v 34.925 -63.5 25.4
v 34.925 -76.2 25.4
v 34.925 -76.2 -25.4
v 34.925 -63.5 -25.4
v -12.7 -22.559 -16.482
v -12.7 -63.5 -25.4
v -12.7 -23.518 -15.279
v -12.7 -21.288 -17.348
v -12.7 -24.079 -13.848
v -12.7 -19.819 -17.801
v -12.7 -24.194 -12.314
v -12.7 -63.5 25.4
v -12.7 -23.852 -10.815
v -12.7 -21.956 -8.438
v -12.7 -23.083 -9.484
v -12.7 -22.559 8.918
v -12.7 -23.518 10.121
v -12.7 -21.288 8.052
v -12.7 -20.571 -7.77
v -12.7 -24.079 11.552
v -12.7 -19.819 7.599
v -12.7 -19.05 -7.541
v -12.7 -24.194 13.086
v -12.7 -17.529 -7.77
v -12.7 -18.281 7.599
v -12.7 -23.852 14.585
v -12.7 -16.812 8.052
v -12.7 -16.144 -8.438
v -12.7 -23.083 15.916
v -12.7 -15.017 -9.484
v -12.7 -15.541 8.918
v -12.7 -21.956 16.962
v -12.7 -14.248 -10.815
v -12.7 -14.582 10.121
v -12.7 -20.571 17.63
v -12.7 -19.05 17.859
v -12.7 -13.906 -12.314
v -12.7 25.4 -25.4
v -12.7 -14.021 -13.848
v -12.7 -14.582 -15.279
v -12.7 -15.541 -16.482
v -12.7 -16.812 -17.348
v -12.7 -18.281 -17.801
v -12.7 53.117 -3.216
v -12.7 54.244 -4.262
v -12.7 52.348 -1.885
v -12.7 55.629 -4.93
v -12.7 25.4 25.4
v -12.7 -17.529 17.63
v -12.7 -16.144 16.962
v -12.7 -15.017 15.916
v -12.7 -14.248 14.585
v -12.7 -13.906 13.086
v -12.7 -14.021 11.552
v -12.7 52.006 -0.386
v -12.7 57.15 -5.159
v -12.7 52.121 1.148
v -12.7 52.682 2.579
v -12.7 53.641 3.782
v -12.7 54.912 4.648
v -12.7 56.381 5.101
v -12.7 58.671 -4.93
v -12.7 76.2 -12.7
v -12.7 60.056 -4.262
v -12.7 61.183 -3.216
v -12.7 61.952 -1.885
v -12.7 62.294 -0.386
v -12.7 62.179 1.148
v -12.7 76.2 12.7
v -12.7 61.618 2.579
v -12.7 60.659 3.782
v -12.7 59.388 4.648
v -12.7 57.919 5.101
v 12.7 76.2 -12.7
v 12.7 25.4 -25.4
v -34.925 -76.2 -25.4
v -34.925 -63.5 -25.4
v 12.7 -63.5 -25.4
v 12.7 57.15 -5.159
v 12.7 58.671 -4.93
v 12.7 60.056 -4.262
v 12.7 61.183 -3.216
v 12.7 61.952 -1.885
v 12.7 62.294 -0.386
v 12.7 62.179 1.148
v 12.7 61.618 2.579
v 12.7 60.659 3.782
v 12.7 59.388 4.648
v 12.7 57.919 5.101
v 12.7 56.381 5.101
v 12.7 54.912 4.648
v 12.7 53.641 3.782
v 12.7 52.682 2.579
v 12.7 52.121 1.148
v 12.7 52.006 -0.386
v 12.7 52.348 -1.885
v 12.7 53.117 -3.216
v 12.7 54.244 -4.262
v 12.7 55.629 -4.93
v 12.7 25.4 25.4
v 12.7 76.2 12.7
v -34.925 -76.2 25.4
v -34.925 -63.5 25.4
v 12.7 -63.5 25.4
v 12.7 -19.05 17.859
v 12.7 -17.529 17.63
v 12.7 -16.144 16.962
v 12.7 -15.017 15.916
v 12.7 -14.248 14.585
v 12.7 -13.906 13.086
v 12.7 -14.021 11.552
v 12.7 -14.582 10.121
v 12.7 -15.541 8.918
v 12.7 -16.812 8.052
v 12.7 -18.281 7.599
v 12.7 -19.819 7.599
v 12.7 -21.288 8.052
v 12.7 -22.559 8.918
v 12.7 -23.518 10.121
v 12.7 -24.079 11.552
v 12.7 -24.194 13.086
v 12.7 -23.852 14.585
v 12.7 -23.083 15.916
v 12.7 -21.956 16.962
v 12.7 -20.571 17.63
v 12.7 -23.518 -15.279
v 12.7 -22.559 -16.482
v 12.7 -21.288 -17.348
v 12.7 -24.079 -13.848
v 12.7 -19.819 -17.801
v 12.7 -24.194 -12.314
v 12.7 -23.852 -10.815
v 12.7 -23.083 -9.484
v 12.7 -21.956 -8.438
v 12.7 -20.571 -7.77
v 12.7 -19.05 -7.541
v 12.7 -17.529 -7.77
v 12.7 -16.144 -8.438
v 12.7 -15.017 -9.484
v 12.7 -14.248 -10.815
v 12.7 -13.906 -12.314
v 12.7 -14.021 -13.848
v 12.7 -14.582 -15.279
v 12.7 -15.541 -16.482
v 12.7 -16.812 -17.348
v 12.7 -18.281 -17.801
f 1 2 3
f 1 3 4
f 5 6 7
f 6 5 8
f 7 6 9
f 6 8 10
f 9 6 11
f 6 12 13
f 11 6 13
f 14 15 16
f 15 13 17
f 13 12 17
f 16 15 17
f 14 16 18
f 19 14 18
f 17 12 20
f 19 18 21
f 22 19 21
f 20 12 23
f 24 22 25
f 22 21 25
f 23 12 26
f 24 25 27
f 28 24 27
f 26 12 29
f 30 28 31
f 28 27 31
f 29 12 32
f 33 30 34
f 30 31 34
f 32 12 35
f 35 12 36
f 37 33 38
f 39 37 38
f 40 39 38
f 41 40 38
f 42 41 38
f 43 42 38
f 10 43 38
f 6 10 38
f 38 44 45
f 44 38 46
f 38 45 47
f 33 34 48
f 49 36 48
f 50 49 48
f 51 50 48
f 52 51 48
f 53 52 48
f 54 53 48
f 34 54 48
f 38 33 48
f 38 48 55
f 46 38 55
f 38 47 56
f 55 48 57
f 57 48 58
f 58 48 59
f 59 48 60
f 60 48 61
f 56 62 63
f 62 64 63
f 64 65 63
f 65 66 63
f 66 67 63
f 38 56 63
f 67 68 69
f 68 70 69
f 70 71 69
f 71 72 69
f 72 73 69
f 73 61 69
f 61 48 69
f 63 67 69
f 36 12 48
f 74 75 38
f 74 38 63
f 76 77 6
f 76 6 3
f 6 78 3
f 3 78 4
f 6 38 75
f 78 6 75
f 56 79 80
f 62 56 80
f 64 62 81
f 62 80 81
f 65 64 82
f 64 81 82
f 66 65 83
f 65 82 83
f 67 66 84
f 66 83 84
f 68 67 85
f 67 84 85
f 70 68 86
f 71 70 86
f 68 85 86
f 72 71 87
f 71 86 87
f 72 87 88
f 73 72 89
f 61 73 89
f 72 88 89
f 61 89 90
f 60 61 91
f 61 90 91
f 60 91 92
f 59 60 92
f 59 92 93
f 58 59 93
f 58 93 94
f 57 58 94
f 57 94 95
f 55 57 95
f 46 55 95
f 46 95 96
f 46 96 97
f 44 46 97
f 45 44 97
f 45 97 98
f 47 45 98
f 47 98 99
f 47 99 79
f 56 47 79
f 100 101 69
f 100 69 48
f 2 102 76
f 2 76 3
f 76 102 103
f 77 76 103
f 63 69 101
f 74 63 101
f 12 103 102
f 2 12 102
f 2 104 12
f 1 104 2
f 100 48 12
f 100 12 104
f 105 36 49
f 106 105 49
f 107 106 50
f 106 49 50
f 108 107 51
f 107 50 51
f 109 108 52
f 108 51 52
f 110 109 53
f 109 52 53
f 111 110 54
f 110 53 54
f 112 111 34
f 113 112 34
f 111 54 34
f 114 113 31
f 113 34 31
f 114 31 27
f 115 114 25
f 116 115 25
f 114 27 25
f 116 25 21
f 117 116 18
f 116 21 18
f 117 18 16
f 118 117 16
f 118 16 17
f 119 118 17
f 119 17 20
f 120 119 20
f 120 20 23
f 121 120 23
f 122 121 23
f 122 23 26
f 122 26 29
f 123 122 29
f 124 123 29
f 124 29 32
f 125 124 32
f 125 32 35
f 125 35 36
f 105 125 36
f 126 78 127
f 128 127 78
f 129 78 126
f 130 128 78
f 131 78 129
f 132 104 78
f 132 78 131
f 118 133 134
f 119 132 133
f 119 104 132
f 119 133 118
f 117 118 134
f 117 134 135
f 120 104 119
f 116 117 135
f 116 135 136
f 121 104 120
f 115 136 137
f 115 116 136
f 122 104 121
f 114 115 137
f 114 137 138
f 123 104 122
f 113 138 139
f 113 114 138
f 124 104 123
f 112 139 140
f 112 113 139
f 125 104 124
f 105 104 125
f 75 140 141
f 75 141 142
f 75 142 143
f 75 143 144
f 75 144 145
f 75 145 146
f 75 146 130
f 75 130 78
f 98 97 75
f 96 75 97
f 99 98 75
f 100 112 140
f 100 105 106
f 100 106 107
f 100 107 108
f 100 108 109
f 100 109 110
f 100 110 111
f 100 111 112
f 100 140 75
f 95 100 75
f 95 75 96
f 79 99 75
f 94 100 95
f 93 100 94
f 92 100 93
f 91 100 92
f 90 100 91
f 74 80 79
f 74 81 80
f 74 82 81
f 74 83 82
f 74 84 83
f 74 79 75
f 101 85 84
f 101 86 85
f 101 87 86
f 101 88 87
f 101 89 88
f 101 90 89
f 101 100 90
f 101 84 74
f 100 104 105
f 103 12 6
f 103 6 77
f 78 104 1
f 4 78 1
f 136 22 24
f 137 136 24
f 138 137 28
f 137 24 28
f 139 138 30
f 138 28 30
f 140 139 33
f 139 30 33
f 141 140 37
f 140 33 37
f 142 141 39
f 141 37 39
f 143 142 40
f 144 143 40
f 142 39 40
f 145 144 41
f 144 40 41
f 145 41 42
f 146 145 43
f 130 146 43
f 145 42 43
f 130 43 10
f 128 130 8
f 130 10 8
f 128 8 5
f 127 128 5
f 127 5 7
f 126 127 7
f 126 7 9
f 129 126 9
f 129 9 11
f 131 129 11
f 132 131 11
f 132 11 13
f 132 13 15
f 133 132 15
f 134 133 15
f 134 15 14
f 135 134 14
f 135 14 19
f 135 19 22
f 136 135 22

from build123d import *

# Parameters (mm, degrees)
SKETCH27_W                 = 69.85
SKETCH27_H                 = 152.4
BOSS_EXTRUDE4_DEPTH        = 25.4
SKETCH28_W                 = 22.225
SKETCH28_H                 = 139.7
CUT_EXTRUDE5_DEPTH         = 26.4
SKETCH30_OUTSIDE_W         = 87.834
SKETCH30_OUTSIDE_H         = 189.434
CUT_EXTRUDE6_DEPTH         = 35.925
CUT_EXTRUDE6_DEPTH_BACK    = 35.925
F_3_8_CLEARANCE_HOLE4_D    = 10.31748
AUXILIARY_MOUNTING_HOLES_D = 10.31748


with BuildPart() as part:
    # Sketch27 → Boss-Extrude4 (new body, symmetric)
    with BuildSketch(Plane.XY):
        Rectangle(SKETCH27_W, SKETCH27_H)
    extrude(amount=BOSS_EXTRUDE4_DEPTH, both=True)

    # Sketch28 → Cut-Extrude5 (cut, symmetric)
    with BuildSketch(Plane.XY):
        with Locations((23.8125, 6.35)):
            Rectangle(SKETCH28_W, SKETCH28_H)
    cut_extrude5 = extrude(amount=CUT_EXTRUDE5_DEPTH, both=True, mode=Mode.SUBTRACT)

    # Mirror1: Cut-Extrude5 across plane
    add(cut_extrude5.mirror(Plane(origin=(0, 0, 0), x_dir=(0, 0, 1), z_dir=(1, 0, 0))), mode=Mode.SUBTRACT)

    # Sketch30 outside → Cut-Extrude6 (cut, two sides)
    with BuildSketch(Plane(origin=(0, 0, 0), x_dir=(0, 0, -1), z_dir=(1, 0, 0))) as cut_extrude6_sk:
        Rectangle(SKETCH30_OUTSIDE_W, SKETCH30_OUTSIDE_H)
        Polygon((-25.4, 25.4), (-25.4, -76.2), (25.4, -76.2), (25.4, 25.4), (12.7, 76.2), (-12.7, 76.2), align=None, mode=Mode.SUBTRACT)
    extrude(amount=CUT_EXTRUDE6_DEPTH, mode=Mode.SUBTRACT)
    extrude(cut_extrude6_sk.sketch, amount=-CUT_EXTRUDE6_DEPTH_BACK, mode=Mode.SUBTRACT)

    # 3/8 Clearance Hole4 (through all)
    with Locations(Plane.ZY.offset(34.925)):
        with Locations((25.4, 82.55), (0, 57.15)):
            Hole(F_3_8_CLEARANCE_HOLE4_D / 2)

    # Auxiliary Mounting Holes (through all)
    with Locations(Plane(origin=(12.7, 0, 0), x_dir=(0, 0, -1), z_dir=(1, 0, 0))):
        with Locations((-12.7, -19.05), (12.7, -19.05)):
            Hole(AUXILIARY_MOUNTING_HOLES_D / 2)


solid = part.part
